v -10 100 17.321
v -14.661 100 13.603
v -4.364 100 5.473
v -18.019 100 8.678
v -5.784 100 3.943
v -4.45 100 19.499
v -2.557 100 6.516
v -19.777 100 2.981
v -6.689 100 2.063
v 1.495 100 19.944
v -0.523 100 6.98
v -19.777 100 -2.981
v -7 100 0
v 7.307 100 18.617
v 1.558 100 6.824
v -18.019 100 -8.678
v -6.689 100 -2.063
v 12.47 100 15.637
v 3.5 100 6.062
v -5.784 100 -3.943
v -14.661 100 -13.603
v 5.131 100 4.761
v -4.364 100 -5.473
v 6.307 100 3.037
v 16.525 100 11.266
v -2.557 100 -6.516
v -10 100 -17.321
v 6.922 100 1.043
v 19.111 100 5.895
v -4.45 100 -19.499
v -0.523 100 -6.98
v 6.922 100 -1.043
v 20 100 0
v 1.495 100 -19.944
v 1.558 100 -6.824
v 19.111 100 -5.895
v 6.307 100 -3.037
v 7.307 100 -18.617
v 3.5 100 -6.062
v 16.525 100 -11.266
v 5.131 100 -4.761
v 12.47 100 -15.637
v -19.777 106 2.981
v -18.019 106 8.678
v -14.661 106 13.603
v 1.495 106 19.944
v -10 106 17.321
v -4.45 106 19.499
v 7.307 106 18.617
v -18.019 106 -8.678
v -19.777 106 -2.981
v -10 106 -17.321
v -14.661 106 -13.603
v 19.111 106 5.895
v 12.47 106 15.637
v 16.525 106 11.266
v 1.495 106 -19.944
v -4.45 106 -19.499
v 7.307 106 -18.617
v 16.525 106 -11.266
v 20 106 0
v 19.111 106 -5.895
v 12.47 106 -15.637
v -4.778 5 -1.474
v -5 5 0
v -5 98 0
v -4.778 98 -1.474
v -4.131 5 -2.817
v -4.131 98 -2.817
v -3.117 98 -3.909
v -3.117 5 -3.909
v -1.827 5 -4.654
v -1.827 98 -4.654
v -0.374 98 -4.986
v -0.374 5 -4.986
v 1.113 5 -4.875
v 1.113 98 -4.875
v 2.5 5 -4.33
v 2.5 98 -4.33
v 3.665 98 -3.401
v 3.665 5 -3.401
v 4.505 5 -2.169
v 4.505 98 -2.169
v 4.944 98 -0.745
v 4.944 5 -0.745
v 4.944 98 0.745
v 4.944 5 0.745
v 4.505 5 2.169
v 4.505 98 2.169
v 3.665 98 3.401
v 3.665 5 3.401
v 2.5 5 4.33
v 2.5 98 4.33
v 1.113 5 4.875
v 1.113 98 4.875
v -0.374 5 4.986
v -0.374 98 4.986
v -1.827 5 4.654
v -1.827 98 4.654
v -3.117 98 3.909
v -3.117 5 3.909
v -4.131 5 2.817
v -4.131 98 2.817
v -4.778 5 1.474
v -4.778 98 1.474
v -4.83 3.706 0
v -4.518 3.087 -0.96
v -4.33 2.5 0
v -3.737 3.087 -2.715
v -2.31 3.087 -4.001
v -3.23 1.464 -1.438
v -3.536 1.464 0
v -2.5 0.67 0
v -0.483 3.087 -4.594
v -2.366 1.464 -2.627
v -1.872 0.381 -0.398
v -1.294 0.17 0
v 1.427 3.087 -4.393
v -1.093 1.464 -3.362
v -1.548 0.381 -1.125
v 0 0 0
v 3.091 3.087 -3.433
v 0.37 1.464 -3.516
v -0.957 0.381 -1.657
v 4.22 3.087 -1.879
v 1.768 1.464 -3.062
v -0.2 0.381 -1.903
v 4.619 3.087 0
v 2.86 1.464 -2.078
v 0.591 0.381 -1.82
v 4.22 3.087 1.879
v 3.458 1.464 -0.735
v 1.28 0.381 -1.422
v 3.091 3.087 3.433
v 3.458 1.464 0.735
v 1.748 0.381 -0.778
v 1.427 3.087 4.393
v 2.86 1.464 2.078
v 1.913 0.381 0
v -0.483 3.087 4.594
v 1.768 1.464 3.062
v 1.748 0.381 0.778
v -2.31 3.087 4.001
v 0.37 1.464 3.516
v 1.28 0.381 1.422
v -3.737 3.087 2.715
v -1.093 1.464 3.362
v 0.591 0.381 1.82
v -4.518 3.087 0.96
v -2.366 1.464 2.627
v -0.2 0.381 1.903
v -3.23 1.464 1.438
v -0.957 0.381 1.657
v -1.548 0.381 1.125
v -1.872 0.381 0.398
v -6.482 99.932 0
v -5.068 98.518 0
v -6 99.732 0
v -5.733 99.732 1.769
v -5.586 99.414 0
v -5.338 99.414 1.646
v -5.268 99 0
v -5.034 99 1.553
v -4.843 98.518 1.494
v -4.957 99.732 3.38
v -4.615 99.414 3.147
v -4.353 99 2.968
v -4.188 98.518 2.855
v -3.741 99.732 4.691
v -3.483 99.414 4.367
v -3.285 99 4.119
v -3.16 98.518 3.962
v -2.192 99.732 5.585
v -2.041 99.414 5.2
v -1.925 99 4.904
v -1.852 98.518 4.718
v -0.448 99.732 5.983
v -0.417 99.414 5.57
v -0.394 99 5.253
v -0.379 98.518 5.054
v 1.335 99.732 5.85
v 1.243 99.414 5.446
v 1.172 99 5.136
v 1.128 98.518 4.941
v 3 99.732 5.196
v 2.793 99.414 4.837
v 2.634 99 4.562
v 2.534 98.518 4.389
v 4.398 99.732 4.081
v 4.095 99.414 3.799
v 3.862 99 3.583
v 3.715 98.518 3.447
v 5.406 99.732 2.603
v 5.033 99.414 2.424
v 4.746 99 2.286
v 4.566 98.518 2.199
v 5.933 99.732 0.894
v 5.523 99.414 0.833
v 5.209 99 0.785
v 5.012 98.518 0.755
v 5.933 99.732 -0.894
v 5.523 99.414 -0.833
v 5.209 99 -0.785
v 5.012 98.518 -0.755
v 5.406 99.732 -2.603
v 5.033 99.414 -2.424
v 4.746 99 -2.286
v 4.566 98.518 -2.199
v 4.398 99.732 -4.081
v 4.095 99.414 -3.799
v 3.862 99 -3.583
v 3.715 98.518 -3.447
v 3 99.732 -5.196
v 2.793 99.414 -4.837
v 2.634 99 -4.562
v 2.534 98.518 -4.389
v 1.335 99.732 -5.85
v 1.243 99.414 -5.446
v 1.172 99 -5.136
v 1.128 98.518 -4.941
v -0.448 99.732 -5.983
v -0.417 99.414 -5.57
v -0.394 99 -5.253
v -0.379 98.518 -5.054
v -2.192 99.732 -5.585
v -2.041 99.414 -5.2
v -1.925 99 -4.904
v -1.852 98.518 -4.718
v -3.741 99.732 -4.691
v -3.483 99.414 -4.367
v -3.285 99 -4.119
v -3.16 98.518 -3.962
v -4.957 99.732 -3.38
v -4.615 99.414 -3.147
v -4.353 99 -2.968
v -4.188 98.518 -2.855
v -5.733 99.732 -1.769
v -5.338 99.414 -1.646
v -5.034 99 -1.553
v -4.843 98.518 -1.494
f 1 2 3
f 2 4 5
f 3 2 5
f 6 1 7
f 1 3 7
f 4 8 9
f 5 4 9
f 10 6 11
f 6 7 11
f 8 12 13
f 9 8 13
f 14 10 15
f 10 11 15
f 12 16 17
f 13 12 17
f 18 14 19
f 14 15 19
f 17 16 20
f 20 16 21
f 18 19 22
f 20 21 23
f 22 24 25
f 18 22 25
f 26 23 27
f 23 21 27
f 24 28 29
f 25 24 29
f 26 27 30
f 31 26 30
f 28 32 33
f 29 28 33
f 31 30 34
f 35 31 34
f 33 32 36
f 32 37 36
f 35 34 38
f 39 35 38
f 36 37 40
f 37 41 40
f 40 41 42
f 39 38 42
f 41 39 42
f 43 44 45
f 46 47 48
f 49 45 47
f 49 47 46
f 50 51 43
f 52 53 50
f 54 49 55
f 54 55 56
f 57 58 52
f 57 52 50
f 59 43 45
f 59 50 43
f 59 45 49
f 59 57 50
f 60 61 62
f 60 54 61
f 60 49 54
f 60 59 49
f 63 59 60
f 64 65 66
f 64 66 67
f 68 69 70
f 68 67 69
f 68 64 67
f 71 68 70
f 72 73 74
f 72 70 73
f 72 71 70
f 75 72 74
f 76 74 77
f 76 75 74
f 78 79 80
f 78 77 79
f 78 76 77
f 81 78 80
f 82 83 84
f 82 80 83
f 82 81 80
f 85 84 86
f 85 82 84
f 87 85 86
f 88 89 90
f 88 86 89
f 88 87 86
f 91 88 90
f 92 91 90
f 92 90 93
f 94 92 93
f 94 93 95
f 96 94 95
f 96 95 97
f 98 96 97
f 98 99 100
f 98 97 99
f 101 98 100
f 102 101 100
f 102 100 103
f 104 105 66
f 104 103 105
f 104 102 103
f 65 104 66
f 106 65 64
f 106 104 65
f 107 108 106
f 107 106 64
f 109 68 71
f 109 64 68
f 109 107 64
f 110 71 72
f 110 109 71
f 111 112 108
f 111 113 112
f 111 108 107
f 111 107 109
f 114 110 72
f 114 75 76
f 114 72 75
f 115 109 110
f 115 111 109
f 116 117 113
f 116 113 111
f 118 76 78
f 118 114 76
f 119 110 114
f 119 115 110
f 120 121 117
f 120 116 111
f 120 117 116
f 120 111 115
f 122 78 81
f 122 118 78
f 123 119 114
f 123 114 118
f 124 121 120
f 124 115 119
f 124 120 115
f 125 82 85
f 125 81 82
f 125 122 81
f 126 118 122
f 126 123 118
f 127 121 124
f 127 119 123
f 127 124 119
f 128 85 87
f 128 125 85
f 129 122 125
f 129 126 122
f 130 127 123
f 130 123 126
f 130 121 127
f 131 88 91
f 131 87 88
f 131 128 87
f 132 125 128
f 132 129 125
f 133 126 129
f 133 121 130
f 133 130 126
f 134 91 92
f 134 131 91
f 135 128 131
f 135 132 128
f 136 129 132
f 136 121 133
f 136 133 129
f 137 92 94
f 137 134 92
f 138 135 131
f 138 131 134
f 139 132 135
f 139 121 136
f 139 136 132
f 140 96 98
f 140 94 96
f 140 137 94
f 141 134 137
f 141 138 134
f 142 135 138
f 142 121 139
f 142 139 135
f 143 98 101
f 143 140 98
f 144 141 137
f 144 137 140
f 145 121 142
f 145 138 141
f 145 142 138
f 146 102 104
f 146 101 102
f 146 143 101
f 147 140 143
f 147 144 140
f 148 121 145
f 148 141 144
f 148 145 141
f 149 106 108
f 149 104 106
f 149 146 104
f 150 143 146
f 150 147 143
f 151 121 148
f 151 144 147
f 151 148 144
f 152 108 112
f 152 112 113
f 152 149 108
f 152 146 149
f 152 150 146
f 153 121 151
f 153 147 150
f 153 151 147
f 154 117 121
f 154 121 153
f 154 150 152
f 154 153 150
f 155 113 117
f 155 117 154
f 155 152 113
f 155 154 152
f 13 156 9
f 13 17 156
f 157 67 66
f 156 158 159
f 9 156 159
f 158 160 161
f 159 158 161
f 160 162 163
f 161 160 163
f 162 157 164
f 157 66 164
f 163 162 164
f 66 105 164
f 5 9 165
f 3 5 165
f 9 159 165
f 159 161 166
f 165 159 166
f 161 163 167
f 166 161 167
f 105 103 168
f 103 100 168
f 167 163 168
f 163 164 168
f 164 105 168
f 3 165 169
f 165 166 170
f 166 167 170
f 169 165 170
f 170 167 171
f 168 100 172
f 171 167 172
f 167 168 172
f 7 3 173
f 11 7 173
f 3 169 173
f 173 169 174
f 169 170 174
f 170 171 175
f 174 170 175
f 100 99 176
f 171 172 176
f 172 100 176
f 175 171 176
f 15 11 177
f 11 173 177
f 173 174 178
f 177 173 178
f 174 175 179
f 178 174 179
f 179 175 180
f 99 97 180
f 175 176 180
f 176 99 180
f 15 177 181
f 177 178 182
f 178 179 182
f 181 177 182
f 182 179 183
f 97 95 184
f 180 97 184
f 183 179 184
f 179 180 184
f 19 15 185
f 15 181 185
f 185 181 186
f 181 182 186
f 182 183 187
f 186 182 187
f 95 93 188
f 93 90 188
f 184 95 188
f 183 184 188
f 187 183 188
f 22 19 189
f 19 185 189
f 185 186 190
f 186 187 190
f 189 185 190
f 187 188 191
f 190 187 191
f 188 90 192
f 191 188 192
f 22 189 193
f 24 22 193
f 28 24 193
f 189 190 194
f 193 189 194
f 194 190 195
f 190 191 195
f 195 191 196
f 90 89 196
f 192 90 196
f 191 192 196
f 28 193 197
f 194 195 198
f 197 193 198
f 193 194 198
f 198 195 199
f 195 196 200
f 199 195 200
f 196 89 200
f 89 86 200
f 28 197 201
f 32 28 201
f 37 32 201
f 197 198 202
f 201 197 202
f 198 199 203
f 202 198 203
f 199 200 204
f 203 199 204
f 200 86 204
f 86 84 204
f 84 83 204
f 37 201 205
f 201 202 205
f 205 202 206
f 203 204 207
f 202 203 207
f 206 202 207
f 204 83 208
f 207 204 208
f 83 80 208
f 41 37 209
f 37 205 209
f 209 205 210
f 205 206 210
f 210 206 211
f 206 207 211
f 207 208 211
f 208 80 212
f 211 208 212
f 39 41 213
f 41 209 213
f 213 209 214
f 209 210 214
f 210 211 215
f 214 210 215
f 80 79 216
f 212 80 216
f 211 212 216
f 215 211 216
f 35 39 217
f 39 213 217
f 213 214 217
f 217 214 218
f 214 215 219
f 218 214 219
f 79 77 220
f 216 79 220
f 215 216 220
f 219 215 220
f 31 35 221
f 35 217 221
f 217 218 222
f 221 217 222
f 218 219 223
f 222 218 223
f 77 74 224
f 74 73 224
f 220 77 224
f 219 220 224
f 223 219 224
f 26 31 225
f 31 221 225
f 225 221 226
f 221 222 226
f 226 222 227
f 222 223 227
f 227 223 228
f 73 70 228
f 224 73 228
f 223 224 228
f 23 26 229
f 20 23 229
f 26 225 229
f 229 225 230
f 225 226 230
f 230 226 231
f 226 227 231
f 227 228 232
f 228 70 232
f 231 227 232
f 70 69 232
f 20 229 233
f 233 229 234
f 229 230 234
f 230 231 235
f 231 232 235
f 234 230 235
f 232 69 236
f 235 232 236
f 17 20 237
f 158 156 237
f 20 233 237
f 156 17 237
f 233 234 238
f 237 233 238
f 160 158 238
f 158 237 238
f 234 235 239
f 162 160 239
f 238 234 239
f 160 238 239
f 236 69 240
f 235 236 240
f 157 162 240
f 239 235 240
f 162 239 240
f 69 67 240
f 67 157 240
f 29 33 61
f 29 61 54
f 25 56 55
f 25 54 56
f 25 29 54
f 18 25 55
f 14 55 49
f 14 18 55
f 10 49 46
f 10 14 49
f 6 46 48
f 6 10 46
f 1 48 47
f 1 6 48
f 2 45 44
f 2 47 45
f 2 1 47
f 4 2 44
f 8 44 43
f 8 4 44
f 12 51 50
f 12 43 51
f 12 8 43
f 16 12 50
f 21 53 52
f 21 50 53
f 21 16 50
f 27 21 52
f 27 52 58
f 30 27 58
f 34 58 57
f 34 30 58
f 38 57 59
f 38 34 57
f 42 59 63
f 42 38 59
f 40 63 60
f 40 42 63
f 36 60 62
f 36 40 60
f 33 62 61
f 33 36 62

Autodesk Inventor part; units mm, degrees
ref_plane "YZ Plane" through (0, 0, 0) normal (1, 0, 0) x (0, 1, 0)
ref_plane "XZ Plane" through (0, 0, 0) normal (0, 1, 0) x (-1, 0, 0)
ref_plane "XY Plane" through (0, 0, 0) normal (0, 0, 1) x (1, 0, 0)
sketch "Sketch1" plane through (0, 0, 0) normal (0, 1, 0) x (-1, 0, 0)
  circle A0 centre (0, 0) radius 5
  dimension "d0" = 10
extrude "Extrusion1" add sketch "Sketch1" along normal blind 100
sketch "Sketch2" plane through (0, 100, 0) normal (0, 1, 0) x (1, 0, 0)
  circle A0 centre (0, 0) radius 20
  dimension "d3" = 40
extrude "Extrusion2" add sketch "Sketch2" along normal blind 6
fillet "Fillet1" radius 2 1 edges at (5, 100, 0)
fillet "Fillet2" radius 5 1 edges at (5, 0, 0)
sketch "Sketch3" plane through (0, 106, 0) normal (0, 1, 0) x (1, 0, 0)
  point P0 (0, 0)
properties part number "Camera Holder"
